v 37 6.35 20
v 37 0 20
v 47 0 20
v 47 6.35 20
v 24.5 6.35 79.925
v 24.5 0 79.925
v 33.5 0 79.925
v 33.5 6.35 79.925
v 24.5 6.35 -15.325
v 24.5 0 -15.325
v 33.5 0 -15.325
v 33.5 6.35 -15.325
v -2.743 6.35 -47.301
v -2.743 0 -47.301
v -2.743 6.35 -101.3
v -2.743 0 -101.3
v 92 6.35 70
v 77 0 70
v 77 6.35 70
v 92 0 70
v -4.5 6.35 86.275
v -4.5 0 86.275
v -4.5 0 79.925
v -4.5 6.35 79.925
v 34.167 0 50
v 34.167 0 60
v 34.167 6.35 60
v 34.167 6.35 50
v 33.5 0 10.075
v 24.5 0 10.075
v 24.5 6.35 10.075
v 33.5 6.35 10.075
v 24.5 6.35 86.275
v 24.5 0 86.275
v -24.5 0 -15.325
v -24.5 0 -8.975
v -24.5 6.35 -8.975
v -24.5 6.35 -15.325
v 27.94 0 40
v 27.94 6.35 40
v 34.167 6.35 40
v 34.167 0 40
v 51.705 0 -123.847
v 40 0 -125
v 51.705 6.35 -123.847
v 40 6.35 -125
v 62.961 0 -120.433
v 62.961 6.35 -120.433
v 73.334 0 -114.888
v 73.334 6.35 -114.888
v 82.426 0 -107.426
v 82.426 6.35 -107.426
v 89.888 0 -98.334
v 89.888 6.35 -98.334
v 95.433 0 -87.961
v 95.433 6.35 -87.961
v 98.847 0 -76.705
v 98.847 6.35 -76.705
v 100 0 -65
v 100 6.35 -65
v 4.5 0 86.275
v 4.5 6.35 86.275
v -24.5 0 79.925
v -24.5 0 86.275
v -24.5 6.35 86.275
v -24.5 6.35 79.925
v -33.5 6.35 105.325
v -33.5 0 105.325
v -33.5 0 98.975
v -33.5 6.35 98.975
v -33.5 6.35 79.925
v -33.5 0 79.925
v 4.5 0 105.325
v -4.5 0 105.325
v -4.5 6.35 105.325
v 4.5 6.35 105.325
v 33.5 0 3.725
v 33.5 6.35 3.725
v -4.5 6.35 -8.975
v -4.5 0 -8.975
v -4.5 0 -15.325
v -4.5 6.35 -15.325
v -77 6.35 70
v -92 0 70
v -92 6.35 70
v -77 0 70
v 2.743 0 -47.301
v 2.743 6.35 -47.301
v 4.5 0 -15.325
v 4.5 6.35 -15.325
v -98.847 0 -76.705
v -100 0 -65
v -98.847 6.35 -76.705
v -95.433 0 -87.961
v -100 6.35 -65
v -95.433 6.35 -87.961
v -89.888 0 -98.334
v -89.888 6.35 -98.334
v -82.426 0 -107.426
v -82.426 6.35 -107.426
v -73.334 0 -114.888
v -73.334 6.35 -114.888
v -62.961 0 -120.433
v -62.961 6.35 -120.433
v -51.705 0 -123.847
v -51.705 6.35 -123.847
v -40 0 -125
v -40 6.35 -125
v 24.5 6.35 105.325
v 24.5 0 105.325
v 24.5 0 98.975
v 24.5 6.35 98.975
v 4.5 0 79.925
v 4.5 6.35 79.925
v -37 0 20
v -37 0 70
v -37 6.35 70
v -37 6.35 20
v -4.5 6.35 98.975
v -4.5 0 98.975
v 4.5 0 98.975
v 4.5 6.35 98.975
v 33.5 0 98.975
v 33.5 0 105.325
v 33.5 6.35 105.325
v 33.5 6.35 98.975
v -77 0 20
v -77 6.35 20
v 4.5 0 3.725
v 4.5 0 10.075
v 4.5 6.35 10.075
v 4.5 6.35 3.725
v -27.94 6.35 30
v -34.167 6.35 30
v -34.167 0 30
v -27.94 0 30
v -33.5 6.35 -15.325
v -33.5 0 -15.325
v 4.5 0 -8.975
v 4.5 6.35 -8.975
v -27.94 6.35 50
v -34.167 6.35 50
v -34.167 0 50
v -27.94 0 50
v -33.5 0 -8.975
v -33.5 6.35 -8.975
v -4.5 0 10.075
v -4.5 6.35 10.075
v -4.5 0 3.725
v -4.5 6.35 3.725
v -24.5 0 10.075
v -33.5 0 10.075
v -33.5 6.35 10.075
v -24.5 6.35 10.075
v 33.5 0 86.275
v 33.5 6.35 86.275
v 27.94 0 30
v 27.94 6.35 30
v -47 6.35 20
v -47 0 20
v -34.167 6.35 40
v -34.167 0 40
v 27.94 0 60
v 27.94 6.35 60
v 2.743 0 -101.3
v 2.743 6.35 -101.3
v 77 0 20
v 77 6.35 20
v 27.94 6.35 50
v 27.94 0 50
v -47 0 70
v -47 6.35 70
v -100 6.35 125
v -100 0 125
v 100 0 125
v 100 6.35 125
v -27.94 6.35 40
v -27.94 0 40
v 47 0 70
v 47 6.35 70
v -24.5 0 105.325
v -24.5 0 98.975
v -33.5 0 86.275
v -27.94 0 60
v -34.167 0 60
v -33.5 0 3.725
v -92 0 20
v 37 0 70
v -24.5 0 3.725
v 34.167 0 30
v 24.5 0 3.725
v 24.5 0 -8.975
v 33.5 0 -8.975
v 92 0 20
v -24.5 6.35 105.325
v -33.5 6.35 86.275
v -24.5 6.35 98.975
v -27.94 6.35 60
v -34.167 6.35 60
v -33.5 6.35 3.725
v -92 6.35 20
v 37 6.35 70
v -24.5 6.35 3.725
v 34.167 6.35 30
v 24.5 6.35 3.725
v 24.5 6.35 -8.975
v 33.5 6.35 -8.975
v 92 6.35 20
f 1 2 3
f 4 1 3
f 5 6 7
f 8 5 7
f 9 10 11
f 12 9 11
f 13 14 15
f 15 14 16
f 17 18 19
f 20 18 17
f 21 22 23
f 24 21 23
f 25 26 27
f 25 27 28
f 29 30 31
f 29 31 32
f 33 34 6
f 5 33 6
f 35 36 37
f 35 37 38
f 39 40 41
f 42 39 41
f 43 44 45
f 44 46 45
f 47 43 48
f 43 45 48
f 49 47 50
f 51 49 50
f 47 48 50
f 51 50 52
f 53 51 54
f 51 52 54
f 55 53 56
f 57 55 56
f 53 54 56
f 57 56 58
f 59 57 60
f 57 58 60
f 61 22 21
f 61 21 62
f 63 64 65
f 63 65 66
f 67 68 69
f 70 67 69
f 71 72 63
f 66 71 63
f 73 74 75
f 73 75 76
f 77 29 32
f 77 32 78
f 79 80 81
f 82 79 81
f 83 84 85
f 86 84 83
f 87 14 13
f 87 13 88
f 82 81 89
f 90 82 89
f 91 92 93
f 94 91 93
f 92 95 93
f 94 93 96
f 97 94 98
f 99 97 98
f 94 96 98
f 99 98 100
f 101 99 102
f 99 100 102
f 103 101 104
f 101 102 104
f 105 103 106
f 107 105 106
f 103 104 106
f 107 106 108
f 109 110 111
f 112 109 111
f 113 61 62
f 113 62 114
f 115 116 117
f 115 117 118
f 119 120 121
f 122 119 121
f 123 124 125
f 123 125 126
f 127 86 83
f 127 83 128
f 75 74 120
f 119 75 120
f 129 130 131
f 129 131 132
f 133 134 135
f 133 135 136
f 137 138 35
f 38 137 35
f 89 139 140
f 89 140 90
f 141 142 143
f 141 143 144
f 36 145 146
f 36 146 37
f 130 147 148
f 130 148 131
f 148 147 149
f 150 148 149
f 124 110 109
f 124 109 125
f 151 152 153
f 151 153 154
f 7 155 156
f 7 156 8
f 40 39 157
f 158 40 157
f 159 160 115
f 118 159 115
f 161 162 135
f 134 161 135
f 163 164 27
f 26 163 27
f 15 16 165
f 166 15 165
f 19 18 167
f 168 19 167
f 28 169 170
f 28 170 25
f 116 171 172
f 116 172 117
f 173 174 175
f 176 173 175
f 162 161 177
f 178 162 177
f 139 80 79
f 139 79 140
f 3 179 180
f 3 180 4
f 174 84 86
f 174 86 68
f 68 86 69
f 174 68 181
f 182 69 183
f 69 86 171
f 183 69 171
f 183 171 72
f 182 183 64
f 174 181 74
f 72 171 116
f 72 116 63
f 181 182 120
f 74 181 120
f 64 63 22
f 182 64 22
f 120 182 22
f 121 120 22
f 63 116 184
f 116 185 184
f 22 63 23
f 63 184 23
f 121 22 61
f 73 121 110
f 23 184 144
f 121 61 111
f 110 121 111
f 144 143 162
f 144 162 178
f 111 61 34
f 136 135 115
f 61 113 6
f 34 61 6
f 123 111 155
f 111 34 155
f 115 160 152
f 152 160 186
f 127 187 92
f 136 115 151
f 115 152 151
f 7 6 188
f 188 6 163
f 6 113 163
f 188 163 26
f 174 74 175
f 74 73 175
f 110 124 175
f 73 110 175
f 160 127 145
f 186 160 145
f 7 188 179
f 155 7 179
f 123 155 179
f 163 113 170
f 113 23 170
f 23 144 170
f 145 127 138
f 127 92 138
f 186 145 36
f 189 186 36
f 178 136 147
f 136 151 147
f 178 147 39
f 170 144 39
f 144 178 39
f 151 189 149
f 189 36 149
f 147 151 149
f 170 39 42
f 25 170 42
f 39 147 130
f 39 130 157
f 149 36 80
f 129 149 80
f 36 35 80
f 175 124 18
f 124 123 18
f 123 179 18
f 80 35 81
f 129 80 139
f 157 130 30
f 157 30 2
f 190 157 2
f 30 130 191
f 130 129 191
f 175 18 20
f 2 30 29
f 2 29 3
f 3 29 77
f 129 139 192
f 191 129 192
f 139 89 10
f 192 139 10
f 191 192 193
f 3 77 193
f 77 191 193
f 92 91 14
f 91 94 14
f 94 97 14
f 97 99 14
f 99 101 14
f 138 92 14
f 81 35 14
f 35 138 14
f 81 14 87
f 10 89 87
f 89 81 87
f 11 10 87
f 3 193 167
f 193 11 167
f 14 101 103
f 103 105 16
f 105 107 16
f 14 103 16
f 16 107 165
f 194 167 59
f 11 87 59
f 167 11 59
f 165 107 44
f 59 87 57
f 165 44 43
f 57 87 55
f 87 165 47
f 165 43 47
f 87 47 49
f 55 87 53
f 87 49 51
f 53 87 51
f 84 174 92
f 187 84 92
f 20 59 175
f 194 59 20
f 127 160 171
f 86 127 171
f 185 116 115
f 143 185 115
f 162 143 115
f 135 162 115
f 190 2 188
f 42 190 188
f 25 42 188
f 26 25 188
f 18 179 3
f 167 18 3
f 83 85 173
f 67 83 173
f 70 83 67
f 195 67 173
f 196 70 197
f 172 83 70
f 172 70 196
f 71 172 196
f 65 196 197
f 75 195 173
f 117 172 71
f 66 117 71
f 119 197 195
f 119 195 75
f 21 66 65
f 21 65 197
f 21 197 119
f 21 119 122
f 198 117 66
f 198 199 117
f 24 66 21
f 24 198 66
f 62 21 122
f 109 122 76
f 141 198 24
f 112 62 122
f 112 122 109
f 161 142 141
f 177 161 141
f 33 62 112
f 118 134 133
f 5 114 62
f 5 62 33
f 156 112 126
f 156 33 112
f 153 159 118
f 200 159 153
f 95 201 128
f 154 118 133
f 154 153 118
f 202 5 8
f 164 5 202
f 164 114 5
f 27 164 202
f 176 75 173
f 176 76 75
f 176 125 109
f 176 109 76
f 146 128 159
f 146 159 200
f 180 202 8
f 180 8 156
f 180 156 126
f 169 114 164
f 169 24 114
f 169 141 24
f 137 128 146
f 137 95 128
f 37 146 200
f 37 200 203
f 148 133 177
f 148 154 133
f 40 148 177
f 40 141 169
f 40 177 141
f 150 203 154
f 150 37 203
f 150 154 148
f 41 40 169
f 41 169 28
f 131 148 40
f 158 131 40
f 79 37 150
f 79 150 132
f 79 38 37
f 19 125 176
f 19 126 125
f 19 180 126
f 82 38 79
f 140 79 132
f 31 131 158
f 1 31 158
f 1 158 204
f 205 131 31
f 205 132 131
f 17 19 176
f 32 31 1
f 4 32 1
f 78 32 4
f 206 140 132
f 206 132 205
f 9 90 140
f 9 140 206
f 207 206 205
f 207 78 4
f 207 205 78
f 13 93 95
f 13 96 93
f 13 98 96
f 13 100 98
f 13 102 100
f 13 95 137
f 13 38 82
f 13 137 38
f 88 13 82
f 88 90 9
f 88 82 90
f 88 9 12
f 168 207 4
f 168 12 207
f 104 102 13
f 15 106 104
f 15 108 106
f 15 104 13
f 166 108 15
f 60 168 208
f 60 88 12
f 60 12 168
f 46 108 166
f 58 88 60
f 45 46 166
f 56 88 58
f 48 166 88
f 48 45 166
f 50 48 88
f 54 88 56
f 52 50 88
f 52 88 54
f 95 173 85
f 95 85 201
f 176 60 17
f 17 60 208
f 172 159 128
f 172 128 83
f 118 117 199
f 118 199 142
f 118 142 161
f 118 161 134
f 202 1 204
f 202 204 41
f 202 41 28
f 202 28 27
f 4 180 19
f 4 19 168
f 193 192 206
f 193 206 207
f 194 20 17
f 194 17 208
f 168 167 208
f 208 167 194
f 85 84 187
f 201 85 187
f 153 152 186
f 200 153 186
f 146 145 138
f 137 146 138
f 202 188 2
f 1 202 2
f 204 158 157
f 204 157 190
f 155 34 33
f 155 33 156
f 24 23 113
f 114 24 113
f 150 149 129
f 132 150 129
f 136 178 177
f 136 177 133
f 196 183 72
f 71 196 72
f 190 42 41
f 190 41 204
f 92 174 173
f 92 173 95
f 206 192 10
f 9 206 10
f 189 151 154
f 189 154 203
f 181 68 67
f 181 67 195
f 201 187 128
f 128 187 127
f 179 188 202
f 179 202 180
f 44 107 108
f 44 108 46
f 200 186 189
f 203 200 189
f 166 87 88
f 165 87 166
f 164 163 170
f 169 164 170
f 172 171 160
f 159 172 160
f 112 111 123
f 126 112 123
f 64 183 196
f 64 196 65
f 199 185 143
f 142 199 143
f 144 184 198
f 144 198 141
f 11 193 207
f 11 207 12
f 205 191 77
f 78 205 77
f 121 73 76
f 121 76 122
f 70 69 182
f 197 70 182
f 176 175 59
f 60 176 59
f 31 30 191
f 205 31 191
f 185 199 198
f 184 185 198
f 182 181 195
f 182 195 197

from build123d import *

# Parameters (mm, degrees)
SKETCH1_W           = 200
SKETCH1_H           = 250
SKETCH1_W_2         = 5.4862609
SKETCH1_H_2         = 53.998630914
SKETCH1_W_3         = 6.227340135
SKETCH1_H_3         = 10
SKETCH1_W_4         = 9
SKETCH1_H_4         = 6.349855652
SKETCH1_H_5         = 6.350070686
SKETCH1_W_5         = 15
SKETCH1_H_6         = 50
SKETCH1_H_7         = 6.349855651
SKETCH1_W_6         = 10
BOSS_EXTRUDE1_DEPTH = 6.35
FILLET1_R           = 60


with BuildPart() as part:
    # Sketch1 → Boss-Extrude1 (new body)
    with BuildSketch(Plane(origin=(0, 0, 0), x_dir=(1, 0, 0), z_dir=(0, 1, 0))):
        Rectangle(SKETCH1_W, SKETCH1_H)
        with Locations((0, 74.300529772)):
            Rectangle(SKETCH1_W_2, SKETCH1_H_2, mode=Mode.SUBTRACT)
        with Locations((31.053670068, -55)):
            Rectangle(SKETCH1_W_3, SKETCH1_H_3, mode=Mode.SUBTRACT)
        with Locations((31.053670068, -35)):
            Rectangle(SKETCH1_W_3, SKETCH1_H_3, mode=Mode.SUBTRACT)
        with Locations((0, -83.1)):
            Rectangle(SKETCH1_W_4, SKETCH1_H_4, mode=Mode.SUBTRACT)
        with Locations((-31.053670068, -55)):
            Rectangle(SKETCH1_W_3, SKETCH1_H_3, mode=Mode.SUBTRACT)
        with Locations((-31.053670068, -35)):
            Rectangle(SKETCH1_W_3, SKETCH1_H_3, mode=Mode.SUBTRACT)
        with Locations((29, -83.1)):
            Rectangle(SKETCH1_W_4, SKETCH1_H_5, mode=Mode.SUBTRACT)
        with Locations((-84.5, -45)):
            Rectangle(SKETCH1_W_5, SKETCH1_H_6, mode=Mode.SUBTRACT)
        with Locations((-29, -83.1)):
            Rectangle(SKETCH1_W_4, SKETCH1_H_5, mode=Mode.SUBTRACT)
        with Locations((29, -102.149855651)):
            Rectangle(SKETCH1_W_4, SKETCH1_H_5, mode=Mode.SUBTRACT)
        with Locations((0, -102.149855652)):
            Rectangle(SKETCH1_W_4, SKETCH1_H_7, mode=Mode.SUBTRACT)
        with Locations((-29, -102.149855651)):
            Rectangle(SKETCH1_W_4, SKETCH1_H_5, mode=Mode.SUBTRACT)
        with Locations((0, -6.9)):
            Rectangle(SKETCH1_W_4, SKETCH1_H_4, mode=Mode.SUBTRACT)
        with Locations((29, -6.9)):
            Rectangle(SKETCH1_W_4, SKETCH1_H_5, mode=Mode.SUBTRACT)
        with Locations((29, 12.149855651)):
            Rectangle(SKETCH1_W_4, SKETCH1_H_5, mode=Mode.SUBTRACT)
        with Locations((0, 12.149855652)):
            Rectangle(SKETCH1_W_4, SKETCH1_H_7, mode=Mode.SUBTRACT)
        with Locations((-29, 12.149855651)):
            Rectangle(SKETCH1_W_4, SKETCH1_H_5, mode=Mode.SUBTRACT)
        with Locations((-29, -6.9)):
            Rectangle(SKETCH1_W_4, SKETCH1_H_5, mode=Mode.SUBTRACT)
        with Locations((-42, -45)):
            Rectangle(SKETCH1_W_6, SKETCH1_H_6, mode=Mode.SUBTRACT)
        with Locations((84.5, -45)):
            Rectangle(SKETCH1_W_5, SKETCH1_H_6, mode=Mode.SUBTRACT)
        with Locations((42, -45)):
            Rectangle(SKETCH1_W_6, SKETCH1_H_6, mode=Mode.SUBTRACT)
    extrude(amount=BOSS_EXTRUDE1_DEPTH)

    # Fillet1
    fillet1_edges = [part.edges().sort_by_distance(p)[0] for p in [
        (-100, 3.175, -125),
        (100, 3.175, -125),
    ]]
    fillet(fillet1_edges, radius=FILLET1_R)


solid = part.part
